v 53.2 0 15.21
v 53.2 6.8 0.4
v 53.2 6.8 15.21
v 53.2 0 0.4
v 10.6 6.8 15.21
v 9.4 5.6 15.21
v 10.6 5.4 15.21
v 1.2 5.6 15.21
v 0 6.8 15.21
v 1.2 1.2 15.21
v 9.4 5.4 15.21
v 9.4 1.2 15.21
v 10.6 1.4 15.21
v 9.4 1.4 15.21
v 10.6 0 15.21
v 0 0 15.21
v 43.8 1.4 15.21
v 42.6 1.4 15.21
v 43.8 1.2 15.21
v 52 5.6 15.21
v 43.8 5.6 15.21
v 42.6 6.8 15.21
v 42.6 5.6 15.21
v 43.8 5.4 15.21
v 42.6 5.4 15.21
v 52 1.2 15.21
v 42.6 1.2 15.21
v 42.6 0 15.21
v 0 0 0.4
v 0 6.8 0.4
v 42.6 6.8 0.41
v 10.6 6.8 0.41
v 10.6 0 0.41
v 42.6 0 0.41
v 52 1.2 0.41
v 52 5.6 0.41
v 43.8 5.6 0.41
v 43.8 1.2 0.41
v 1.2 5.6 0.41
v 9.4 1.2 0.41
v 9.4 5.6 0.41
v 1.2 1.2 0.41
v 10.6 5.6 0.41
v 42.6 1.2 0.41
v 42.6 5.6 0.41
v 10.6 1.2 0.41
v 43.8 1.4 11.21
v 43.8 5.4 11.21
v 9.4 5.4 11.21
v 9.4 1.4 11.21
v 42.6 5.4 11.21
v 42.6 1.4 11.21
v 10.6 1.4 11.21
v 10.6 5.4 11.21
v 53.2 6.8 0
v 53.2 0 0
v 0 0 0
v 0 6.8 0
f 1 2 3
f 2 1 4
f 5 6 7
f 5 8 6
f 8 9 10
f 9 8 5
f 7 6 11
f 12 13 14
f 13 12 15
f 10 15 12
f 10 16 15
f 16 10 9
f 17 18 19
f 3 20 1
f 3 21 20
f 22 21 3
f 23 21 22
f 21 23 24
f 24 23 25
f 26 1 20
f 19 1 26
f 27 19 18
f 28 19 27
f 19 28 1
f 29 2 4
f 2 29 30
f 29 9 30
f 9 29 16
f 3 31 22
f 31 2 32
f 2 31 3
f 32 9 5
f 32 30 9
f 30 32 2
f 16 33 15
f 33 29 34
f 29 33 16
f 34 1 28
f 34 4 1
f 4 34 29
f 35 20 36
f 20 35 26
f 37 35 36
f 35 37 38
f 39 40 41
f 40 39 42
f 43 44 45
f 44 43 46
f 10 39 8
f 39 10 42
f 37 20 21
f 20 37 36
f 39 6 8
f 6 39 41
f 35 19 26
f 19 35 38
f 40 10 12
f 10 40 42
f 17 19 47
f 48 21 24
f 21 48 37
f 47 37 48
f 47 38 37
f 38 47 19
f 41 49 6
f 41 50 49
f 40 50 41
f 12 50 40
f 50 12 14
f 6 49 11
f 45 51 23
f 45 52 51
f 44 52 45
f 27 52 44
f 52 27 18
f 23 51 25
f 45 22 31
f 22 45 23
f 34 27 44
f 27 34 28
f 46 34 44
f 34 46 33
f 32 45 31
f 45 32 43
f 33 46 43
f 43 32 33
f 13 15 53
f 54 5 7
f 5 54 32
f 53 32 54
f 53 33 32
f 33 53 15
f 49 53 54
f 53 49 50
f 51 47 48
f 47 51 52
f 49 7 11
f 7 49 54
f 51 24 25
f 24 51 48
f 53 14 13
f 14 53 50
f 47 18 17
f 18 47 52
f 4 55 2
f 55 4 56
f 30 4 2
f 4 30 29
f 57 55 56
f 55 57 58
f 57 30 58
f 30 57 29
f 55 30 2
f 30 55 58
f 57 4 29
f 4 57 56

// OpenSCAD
// file: ../../Base/Boxes.scad
// Fischertechnik Box Foundation
// Pre-designed Boxes

use <Constants.scad>

include <PlacementOptions.scad>

box190Width = 190;
box190Depth = 130;
box130Width = 130;
box130Depth = 95;
boxUsageHeight = 33.9;
boxWallThickness = 2.4;
boxBaseThickness = 1.0;
boxWebWidth = 3.0;

// getBoxWallThickness()
// Gets the wall thickness of a Fischertechnik Box

function getBoxWallThickness() = boxWallThickness;

// Gets the usable height of a fischertechnik box
function getBoxUsageHeight() = boxUsageHeight;

// Gets the thickness of the Fischertechnik box base.
function getBoxBaseThickness() = boxBaseThickness;

// Gets the width of a box web
function getBoxWebWidth() = boxWebWidth;

// Gets the usable inner space of a Box 190 as an x/y-list
function getBox190Space() = [
    box190Width - 2*getBoxWallThickness(), 
    box190Depth - 2*getBoxWallThickness() ];

// Imports the Fischertechnik empty box 130x190 mm and places it at position 0,0
// 190x130 are the outer sizes, the inner space is slightly smaller. Use getBox190Space() to get the inner sizes.
// This module needs the STL file "Fischertechnik Box 130x190.stl" in the library path.
// The box is positioned that the usable inner space is at the 0,0,0 position. The

module Box190() {
    translate([-getBoxWallThickness(),-getBoxWallThickness(),-getBoxBaseThickness()])
        import("Fischertechnik Box 130x190.stl", convexity=3);
}

// Gets the usable inner space of a Box 130 as an x/y-list
function getBox130Space() = [
    box130Width - 2*getBoxWallThickness(), 
    box130Depth - 2*getBoxWallThickness() ];

// Imports the Fischertechnik empty box 95x130 mm and places it at position 0,0
// 190x130 are the outer sizes, the inner space is slightly smaller. Use getBox190Space() to get the inner sizes.
// This module needs the STL file "Fischertechnik Box 95x130.stl" in the library path.
// The box is positioned that the usable inner space is at the 0,0,0 position. The

module Box130() {
    translate([-getBoxWallThickness(),-getBoxWallThickness(),-getBoxBaseThickness()])
        import("Fischertechnik Box 95x130.stl", convexity=3);
}

// Creates a web at the specified box walls
// corner 0 = LowerLeft, 1 = UpperLeft, 2 = UpperRight, 3 = LowerRight
// side 0 = LeftOfCorner, 1 = RightOfCorner
// distance = Distance in mm from the corner
// box = inner width and depth of the box (default: Box 190)
// webWidth = length of the web (default is 3 mms)
// webThickness = thickness of the web (default is 1 mm)

module BoxWeb(corner, side, distance, box=getBox190Space(), webWidth=getBoxWebWidth(), webThickness=1.0) {
    sink = getBoxWallThickness()/2;

    width = (corner % 2 == 0) ? 
            (side == LeftOfCorner ? webWidth : webThickness) :
            (side == LeftOfCorner ? webThickness : webWidth);

    depth = (corner % 2 == 0) ? 
            (side == RightOfCorner ? webWidth : webThickness) :
            (side == RightOfCorner ? webThickness : webWidth);
    
    xDiff = corner == LowerLeft ? 
                (side == LeftOfCorner ? -sink : distance) :
            (corner == UpperLeft ?                
                (side == LeftOfCorner ? distance : -sink) :
            (corner == UpperRight ?
                (side == LeftOfCorner ? box.x-webWidth+sink : box.x-distance-webThickness) :
                (side == LeftOfCorner ? box.x-distance-webThickness: box.x-webWidth+sink)));

    yDiff = corner == LowerLeft ? 
                (side == RightOfCorner ? -sink : distance) :
            (corner == UpperLeft ?
                (side == RightOfCorner ? box.y-distance : box.y-webWidth+sink) :
            (corner == UpperRight ?
                (side == RightOfCorner ? box.y-webWidth+sink : box.y-distance) :
                (side == RightOfCorner ? distance : -sink)));
    
    translate([xDiff, yDiff, -getExcess()])
        cube([width, depth, boxUsageHeight + 2*getExcess()]);
}
// file: ../../Base/Rotation.scad
// Fischertechnik Box Foundation
// Geometry Helpers Rotation

include <PlacementOptions.scad>

// getRotatedSpace(space, rotation=NoRotation)
// Rotates the space dependent on the specified rotation

function getRotatedSpace(space, rotation=NoRotation) = [
    (rotation == Rotate90 || rotation == Rotate270) ? space.y : space.x,
    (rotation == Rotate90 || rotation == Rotate270) ? space.x : space.y
];

// Rotates the given space around the fixed left lower corner
// space = the space the children needs as width/depth list [width,depth]
// rotation = 0 Rotate0 degrees, 1 Rotate90 degrees, 2 Rotate180 degrees, 3 Rotate270 degrees (equivalent to -90)

module RotateFix(space, rotation=Rotate0) {
    dy = (rotation == Rotate0 || rotation == Rotate270) ? 0 :
        (rotation == Rotate90) ? space.x :
        space.y;
    dx = (rotation < Rotate180) ? 0 :
        (rotation == Rotate180) ? space.x :
        space.y;
    
    translate([dx, dy, 0])
        rotate([0, 0, rotations[rotation]])
            children();
}
// file: ../../Base/Alignment.scad
// Fischertechnik Box Foundation
// Geometry Helpers Alignment

include <PlacementOptions.scad>

// getAlignedX(elementWidth, spaceWidth, align=AlignRight, offset=0)
// Gets the aligned X offset of an element with the given
// width in the given space.
// elementWidth = The width of the element to positon
// spaceWidth = The space where the element should be aligned
// align = 0 AlignLeft, 1 AlignCenter, 2 AlignRight
// offset = an optional offset from the aligned position. When
// aligned left or centered, then positive values are in X direction.
// When aligned right then positive values are in negative X direction.

function getAlignedX(elementWidth, spaceWidth, align=AlignRight, offset=0) =
    (align == AlignLeft) ?
        offset :
        ((align == AlignCenter) ?
        (spaceWidth - elementWidth)/2 + offset :
        spaceWidth - offset - elementWidth);

// getAlignedY(elementDepth, spaceDepth, align=AlignTop, offset=0)
// Gets the aligned Y offset of an element with the given
// depth in the given space.
// elementDepth = The depth of the element to positon
// spaceDepth = The space where the element should be aligned
// align = 0 AlignBottom, 1 AlignCenter, 2 AlignTop
// offset = an optional offset from the aligned position. When
// aligned bottom or centered, then positive values are in Y direction.
// When aligned top then positive values are in negative Y direction.

function getAlignedY(elementDepth, spaceDepth, align=AlignTop, offset=0) =
    (align == AlignBottom) ?
        offset :
        ((align == AlignCenter) ?
        (spaceDepth - elementDepth)/2 + offset :
        spaceDepth - offset - elementDepth);
// file: ../../Base/PlacementOptions.scad
// Fischertechnik Box Foundation
// Placement Options

// Alignment
NoAlign = 0;
AlignLeft = 1;
AlignBottom = 2;
AlignCenter = 3;
AlignRight = 4;
AlignTop = 5;

// Element rotation degree steps
rotations = [0, -90, -180, -270];

// Rotation
NoRotation = 0;
Rotate0 = 0;
Rotate90 = 1;
Rotate180 = 2;
Rotate270 = 3;

// Docking (seen from above)
NoDock = -1;
DockLeft = 0;
DockTop = 1;
DockRight = 2;
DockCorner = 2;
DockBottom = 3;

// Web corners
LowerLeft = 0;
UpperLeft = 1;
UpperRight = 2;
LowerRight = 3;

// Web position relative to corner
LeftOfCorner = 0;
RightOfCorner = 1;
// file: ../../Base/Placement.scad
// Fischertechnik Box Foundation
// Geometry Helpers Placement

use <Constants.scad>
use <Alignment.scad>
use <Rotation.scad>
use <Boxes.scad>

include <PlacementOptions.scad>

// Place(x=0, y=0, elementSpace=[0,0], alignX=AlignLeft, alignY=AlignBottom, rotation=Rotate0, boxSpace=getBox190Space())
// Places the child at the specified position
// y = Y-Position. This is a relative position when an X aligment is specified.
// x = X-Position. This is a relative position when an Y aligment is specified.
// elementSpace = space of the element to be placed [x,y]
// alignX = -1=NoAlign, 0 AlignLeft, 1 AlignCenter, 3 AlignRight (elementSpace and boxSpace required!)
// alignY = -1=NoAlign, 2 AlignBottom, 1 AlignCenter, 4 AlignTop (elementSpace and boxSpace required!)
// rotation = 0 Rotate0 0 degrees, 1 Rotate90 90 degrees, 
// 2 Rotate180 180 degrees, 3 Rotate270 270 degrees (equivalent to -90)
// boxSpace = Inner space of the box where the placement occurs [x,y] - default is Box 190x130 inner space

module Place(x=0, y=0, elementSpace=[0,0], 
  alignX=AlignLeft, alignY=AlignBottom, 
  rotation=NoRotation, boxSpace=getBox190Space()) {

    module Position(x, y, space, rotation=Rotate0) {
        translate([x, y, 0])
            RotateFix(space, rotation)
                children();
    }

    space = getRotatedSpace(elementSpace, rotation);
    alignedX = getAlignedX(space.x, boxSpace.x, alignX, x);
    alignedY = getAlignedY(space.y, boxSpace.y, alignY, y);
    Position(alignedX, alignedY, elementSpace, rotation)
        children();
}

// Center(space=getBox130Space(), elementSpace=[0,0])
// space = Space where the children is centered. For cylinder use centered=true and no elementSpace.
// elementSpace = space of the element to be centered [x,y]

module Center(space=getBox190Space(), elementSpace=[0,0]) {
    translate([(space.x - elementSpace.x) / 2, (space.y - elementSpace.y) / 2])
        children(0);
}

// CenterHorizontal(width=0, y=0, offset=0, space=getBox130Space())
// space = Space where the children is centered. For cylinder use centered=true and no elementSpace.
// elementSpace = space of the element to be centered [x,y]

module CenterHorizontal(width=0, y=0, offset=0, space=getBox190Space()) {
    translate([(space.x - width) / 2 + offset, y])
        children(0);
}

// CenterVertical(depth=0, x=0, offset=0, space=getBox130Space())
// space = Space where the children is centered. For cylinder use centered=true and no elementSpace.
// elementSpace = space of the element to be centered [x,y]

module CenterVertical(depth=0, x=0, offset=0, space=getBox190Space()) {
    translate([x, (space.y - depth) / 2 + offset])
        children(0);
}
// file: ../../Elements/AxisClip10.scad
// Fischertechnik Box Library
// Axis for clip 10
// 31023

use <../ModelBase/Simple.scad>

width = 12;
depth = 12;
height = 23;

// getAxisClip10Space()
// Gets the space of a frame for a clip 10 with spring ring (mot2)

function getAxisClip10Space() = [width, depth, height];

// AxisClip10()
// Axis for clip 10 with spring ring (mot2)

module AxisClip10() {
    LeveledAxisWithSpace(height, height-10, getAxisClip10Space());
}

// Tests
color("lightgray")
AxisClip10();
// file: ../../Base/Constants.scad
// Fischertechnik Box Foundation
// Constants

// Constant values necessary for multiple elements

// Base constants
dividerThickness = 1.2;
excess = 0.01;
fragments = 90;
tolerance = 0.8;

// Gets the thickness of a divider 
function getDividerThickness() = dividerThickness;

// Gets the excess that is used to merge walls into each other
function getExcess() = excess;

// Gets amount of fragments of a cylinder
function getFragments() = fragments;

// Gets the inner tolerance of a frame to each side
function getTolerance() = tolerance;


// Fischertechnik specific constants
axisDiameter = 4;
axisBottomDiameter = axisDiameter + 1;
standardEdgeDistance = 2.5;
standardWebDistance = 11.5;
standardCornerLength = 15;
tubeWallFactor = 0.8;

// Gets axis diameter
function getAxisDiameter() = axisDiameter;

// Gets axis bottom diameter for thicker part at the bottom
function getAxisBottomDiameter() = axisBottomDiameter;

// gets the standard distance to the wall of the box for dockable frames with webs
function getStandardEdgeDistance() = standardEdgeDistance;

// gets the standard distance of each web to the corner of the dockable frame
function getStandardWebDistance() = standardWebDistance;

// gets the standard length of the corner walls of a dockable frame
function getStandardCornerLength() = standardCornerLength;

// gets the wall thickness of a tube.
function getTubeWallThickness() = tubeWallFactor * getDividerThickness();
// file: ../../Elements/FrameAxis50.scad
// Fischertechnik Box Library
// Frame for single 50 mm Axis
// 31033

use <../ModelBase/Complex.scad>

length = 50;

// getFrameAxis50Space()
// Gets the width (.x) and depth (.y) of the axis frame.

function getFrameAxis50Space() = getFrameAxisSpace(length);

// FrameAxis50()
// Axis holder for a single 50 mm axis.

module FrameAxis50() {
    FrameAxis(length);
}

// Test
color("lightgray")
FrameAxis50();
// file: ../TestPrint.scad
// 3D Print Test Base

use <../Base/Constants.scad>

use <../Elements/AxisClip10.scad>

module TestPrint(elementSpace) {
    cube([elementSpace.x, elementSpace.y, 0.4]);
    translate([0,0,0.4+getExcess()]) {
        children();
    }
}

TestPrint(getAxisClip10Space())
    AxisClip10();
// main file
// 3D Print Test
// FrameAxis50

use <../TestPrint.scad>
use <../../Elements/FrameAxis50.scad>

TestPrint(getFrameAxis50Space())
    FrameAxis50();
